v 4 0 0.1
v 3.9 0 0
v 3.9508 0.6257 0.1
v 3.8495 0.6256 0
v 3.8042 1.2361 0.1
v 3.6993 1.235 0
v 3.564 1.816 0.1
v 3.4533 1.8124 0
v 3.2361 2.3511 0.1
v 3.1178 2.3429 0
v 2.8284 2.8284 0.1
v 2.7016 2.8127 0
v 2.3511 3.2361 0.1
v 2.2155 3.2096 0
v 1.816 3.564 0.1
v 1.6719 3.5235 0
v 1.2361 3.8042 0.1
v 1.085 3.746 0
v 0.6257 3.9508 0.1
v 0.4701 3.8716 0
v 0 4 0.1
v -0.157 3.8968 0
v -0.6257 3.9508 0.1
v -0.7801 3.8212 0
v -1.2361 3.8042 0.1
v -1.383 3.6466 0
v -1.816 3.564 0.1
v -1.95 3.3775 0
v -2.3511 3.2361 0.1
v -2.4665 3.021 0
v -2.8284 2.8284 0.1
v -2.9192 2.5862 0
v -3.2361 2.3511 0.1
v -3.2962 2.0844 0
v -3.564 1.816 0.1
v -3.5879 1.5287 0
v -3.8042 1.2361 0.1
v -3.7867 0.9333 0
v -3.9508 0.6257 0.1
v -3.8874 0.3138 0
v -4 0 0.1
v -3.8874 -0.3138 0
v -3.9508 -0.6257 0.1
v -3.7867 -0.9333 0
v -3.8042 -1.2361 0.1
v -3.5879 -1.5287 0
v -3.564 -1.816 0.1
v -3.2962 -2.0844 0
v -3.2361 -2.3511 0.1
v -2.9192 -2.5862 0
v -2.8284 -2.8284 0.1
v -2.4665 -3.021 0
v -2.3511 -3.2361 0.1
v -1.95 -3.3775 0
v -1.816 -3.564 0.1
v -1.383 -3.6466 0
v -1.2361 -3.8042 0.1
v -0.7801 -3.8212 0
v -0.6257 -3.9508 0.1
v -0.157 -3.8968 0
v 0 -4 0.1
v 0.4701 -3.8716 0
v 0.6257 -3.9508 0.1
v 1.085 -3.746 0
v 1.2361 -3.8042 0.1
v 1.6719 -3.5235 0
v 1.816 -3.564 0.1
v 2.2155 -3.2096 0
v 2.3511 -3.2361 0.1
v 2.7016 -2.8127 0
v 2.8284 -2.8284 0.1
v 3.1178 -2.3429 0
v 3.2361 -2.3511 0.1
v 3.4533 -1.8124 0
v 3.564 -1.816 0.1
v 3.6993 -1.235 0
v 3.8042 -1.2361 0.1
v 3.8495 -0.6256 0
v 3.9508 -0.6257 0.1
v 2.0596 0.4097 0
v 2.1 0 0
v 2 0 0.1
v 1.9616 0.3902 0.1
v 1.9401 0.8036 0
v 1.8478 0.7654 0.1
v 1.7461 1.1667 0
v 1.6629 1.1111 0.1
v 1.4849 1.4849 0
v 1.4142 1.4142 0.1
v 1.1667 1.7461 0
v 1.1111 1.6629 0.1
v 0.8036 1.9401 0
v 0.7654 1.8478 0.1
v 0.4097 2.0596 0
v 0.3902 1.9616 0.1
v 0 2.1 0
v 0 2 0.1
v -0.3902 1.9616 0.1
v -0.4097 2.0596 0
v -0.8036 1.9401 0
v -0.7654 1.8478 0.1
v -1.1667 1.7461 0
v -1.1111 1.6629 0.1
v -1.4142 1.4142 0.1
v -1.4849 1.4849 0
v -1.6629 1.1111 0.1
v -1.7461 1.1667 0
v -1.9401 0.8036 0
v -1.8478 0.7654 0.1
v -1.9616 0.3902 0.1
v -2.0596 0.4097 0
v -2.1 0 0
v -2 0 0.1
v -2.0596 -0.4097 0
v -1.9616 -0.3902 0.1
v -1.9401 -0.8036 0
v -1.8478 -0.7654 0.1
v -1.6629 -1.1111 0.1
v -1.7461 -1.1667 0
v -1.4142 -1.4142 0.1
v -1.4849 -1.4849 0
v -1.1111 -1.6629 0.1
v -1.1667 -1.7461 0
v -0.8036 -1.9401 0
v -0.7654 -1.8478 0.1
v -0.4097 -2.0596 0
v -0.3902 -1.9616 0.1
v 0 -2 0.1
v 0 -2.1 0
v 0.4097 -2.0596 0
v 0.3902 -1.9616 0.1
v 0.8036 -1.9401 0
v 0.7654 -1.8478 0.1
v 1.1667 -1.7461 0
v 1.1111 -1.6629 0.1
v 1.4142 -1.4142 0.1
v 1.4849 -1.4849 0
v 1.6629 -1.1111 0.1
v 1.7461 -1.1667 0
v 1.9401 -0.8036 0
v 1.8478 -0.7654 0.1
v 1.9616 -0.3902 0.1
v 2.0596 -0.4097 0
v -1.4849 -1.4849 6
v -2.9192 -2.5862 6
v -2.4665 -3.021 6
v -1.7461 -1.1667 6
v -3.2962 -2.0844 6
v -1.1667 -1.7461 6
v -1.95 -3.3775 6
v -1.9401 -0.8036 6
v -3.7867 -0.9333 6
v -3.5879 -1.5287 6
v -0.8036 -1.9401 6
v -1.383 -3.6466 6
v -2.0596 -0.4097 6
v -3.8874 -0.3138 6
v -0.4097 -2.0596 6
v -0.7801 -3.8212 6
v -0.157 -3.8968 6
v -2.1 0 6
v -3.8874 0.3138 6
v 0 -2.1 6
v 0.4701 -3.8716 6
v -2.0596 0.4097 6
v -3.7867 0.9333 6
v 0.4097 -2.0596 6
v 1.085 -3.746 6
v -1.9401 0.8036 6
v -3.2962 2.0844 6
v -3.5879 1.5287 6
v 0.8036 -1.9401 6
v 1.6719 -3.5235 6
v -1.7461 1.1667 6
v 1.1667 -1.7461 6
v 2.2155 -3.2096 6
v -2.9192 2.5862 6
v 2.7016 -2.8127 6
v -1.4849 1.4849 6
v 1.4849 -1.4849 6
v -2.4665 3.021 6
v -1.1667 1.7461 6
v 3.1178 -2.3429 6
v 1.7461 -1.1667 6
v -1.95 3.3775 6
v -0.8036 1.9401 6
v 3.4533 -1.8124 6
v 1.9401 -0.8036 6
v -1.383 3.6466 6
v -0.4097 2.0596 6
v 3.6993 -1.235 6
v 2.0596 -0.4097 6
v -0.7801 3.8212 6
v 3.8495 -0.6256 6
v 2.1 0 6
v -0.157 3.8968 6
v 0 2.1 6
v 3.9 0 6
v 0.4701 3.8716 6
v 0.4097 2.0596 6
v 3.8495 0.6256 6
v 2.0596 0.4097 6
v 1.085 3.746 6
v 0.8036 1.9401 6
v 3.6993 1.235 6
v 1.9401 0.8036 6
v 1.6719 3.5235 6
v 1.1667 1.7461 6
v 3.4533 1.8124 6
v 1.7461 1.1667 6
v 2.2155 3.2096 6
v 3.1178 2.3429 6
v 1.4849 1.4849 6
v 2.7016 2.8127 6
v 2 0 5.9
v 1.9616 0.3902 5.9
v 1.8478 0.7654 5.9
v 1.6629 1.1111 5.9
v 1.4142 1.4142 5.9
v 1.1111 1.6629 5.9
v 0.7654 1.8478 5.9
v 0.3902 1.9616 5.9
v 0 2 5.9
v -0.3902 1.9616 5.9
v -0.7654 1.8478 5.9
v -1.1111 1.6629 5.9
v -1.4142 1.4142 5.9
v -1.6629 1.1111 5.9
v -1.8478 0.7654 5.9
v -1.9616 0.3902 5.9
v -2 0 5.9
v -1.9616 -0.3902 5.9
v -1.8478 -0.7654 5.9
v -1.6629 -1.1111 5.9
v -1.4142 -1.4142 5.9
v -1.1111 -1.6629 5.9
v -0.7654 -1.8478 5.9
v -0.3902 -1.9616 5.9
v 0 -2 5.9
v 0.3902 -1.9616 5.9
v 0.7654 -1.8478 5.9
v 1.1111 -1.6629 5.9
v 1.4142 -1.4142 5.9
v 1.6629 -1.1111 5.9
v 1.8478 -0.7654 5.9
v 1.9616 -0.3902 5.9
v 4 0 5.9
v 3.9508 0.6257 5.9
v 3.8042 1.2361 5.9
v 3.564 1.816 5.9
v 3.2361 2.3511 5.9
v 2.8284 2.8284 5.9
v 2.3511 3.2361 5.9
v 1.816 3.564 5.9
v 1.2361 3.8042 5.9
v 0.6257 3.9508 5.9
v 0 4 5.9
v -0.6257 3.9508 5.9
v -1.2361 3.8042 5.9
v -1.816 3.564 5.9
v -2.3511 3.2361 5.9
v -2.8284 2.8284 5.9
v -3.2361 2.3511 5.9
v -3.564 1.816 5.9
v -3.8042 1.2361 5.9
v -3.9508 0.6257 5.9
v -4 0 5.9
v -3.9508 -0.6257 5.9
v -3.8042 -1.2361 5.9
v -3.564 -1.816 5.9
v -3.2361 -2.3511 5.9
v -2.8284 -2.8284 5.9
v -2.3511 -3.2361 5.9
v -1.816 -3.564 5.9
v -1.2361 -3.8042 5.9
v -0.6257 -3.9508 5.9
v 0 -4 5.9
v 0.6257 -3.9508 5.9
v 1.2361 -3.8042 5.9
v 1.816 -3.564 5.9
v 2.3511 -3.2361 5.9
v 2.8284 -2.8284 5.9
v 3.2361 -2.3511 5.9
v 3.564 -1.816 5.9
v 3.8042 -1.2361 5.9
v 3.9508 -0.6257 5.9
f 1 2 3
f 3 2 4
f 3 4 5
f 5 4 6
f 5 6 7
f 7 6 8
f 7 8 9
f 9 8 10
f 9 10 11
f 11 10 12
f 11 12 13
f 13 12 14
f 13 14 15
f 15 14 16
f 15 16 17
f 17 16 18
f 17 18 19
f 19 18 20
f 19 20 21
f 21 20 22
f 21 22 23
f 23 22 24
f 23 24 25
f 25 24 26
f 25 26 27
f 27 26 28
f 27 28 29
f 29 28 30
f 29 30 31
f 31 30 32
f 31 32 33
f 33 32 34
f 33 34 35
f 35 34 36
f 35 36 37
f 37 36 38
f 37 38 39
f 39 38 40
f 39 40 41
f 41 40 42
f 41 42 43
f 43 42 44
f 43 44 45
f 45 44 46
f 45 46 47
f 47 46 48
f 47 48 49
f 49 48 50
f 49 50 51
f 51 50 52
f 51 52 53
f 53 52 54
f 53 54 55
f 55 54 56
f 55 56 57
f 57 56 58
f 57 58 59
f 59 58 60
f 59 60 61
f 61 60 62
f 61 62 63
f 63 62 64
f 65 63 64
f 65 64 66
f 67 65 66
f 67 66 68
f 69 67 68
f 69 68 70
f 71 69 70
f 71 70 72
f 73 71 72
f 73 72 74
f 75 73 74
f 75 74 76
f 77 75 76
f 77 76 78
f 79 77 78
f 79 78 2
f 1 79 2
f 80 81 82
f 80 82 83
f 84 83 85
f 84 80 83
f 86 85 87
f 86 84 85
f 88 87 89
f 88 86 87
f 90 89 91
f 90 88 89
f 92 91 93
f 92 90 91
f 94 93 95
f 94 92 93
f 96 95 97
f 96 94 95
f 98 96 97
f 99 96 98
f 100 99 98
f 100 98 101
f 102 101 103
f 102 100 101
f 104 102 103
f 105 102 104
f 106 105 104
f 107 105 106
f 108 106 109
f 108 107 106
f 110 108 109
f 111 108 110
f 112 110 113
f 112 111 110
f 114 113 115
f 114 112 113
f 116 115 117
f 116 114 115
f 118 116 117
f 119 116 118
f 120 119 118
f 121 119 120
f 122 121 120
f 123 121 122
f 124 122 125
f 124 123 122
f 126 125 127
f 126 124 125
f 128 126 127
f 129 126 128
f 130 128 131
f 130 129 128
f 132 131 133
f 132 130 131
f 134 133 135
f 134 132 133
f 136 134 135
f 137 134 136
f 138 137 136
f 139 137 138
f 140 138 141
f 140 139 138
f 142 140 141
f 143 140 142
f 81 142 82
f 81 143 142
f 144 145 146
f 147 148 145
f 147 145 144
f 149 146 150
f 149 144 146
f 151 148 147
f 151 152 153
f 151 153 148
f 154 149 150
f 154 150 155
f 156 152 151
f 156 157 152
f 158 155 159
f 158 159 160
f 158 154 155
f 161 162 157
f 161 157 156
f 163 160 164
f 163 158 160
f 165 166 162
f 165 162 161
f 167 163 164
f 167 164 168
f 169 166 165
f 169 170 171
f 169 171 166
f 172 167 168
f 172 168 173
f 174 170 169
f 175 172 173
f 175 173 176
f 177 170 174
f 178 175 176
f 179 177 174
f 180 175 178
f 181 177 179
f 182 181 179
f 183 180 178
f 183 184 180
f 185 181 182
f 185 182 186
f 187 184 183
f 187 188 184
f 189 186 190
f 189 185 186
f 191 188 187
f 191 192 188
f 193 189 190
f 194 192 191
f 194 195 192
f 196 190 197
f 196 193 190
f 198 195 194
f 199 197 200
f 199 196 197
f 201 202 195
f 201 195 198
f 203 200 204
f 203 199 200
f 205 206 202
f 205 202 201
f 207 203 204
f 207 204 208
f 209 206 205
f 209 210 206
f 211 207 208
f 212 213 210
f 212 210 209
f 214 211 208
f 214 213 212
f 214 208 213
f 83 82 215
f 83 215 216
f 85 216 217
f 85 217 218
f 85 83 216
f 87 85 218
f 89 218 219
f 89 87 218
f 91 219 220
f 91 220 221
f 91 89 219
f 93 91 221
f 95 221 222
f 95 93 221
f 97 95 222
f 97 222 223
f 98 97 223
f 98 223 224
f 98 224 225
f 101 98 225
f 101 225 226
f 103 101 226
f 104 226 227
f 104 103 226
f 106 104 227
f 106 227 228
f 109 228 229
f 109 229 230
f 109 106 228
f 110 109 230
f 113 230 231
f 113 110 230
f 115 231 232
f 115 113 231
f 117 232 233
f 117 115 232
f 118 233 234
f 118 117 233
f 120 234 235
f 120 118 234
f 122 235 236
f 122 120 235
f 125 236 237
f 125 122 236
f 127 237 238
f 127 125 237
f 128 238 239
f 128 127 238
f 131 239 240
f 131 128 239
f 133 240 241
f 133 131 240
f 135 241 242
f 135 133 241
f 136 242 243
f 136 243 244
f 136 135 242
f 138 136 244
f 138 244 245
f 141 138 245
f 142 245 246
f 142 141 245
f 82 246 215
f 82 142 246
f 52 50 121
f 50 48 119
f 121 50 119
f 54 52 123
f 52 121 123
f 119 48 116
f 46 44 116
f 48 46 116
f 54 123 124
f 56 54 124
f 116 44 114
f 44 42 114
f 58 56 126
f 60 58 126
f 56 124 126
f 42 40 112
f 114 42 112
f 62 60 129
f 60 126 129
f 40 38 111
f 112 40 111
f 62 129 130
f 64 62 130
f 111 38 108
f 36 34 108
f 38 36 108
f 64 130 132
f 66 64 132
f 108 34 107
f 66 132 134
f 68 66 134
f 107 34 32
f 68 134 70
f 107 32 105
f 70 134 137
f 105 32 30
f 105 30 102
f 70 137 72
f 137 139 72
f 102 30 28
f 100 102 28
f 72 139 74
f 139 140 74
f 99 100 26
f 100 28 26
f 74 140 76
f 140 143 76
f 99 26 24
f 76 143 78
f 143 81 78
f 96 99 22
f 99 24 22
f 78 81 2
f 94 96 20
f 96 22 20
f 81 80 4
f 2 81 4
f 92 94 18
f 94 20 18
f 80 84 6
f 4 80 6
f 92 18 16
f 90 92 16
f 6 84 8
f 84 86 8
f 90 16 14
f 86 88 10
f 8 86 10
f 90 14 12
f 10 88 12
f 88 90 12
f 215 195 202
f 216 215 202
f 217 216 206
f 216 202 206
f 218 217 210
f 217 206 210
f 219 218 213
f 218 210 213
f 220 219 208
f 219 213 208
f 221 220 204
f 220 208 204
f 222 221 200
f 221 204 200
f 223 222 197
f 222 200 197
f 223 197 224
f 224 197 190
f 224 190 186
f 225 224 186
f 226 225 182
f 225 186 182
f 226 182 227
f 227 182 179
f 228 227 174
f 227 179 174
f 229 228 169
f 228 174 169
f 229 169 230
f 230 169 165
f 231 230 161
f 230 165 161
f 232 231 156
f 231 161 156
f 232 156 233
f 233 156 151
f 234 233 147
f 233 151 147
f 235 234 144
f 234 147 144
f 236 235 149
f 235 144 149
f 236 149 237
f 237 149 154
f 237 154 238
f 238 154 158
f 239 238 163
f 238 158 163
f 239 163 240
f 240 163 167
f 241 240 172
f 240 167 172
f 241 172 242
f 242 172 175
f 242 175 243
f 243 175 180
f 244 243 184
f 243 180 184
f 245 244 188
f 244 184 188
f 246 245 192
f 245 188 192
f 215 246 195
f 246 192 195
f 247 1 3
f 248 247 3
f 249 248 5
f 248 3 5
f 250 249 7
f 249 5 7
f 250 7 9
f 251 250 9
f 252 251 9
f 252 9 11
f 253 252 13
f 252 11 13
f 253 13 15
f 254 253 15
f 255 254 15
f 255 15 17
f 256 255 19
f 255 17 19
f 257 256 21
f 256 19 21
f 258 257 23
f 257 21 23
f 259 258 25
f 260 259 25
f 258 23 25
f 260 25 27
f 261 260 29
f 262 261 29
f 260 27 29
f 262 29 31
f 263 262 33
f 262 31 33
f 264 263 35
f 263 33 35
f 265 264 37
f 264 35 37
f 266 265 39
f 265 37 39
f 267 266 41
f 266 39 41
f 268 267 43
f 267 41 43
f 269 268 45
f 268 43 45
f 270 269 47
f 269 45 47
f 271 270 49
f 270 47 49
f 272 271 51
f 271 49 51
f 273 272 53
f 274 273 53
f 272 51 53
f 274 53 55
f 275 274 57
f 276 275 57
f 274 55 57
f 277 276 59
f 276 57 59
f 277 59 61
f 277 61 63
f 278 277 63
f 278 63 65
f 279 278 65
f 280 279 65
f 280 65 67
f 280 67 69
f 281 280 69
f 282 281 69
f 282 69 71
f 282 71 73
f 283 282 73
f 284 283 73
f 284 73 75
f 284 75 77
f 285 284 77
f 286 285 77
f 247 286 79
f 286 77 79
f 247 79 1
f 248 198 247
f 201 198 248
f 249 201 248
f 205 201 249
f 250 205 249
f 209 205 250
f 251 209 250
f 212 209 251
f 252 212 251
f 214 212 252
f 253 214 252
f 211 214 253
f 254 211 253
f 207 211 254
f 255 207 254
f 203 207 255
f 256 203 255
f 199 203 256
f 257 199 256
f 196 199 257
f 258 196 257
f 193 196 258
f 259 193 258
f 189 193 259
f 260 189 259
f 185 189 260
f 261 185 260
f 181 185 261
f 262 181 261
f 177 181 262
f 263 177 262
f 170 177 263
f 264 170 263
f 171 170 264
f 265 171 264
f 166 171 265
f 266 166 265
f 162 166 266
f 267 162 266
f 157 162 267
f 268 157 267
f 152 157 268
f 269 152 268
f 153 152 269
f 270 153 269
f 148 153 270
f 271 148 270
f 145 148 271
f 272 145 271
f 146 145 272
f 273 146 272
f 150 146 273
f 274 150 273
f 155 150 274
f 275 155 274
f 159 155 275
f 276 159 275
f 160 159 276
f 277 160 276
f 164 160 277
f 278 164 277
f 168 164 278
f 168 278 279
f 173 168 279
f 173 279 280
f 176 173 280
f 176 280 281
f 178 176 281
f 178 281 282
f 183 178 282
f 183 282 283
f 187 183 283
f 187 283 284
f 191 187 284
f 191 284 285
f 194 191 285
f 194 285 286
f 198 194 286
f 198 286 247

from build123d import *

# Parameters (mm, degrees)
CROQUIS1_R              = 4
CROQUIS1_R_2            = 2
SALIENTE_EXTRUIR1_DEPTH = 6
CHAFL_N1_SIZE           = 0.1


with BuildPart() as part:
    # Croquis1 → Saliente-Extruir1 (new body)
    with BuildSketch(Plane.XY):
        Circle(CROQUIS1_R)
        Circle(CROQUIS1_R_2, mode=Mode.SUBTRACT)
    extrude(amount=SALIENTE_EXTRUIR1_DEPTH)

    # Chaflán1
    chafl_n1_edges = [part.edges().sort_by_distance(p)[0] for p in [
        (-4, 0, 0),
        (-4, 0, 6),
        (-2, 0, 0),
        (-2, 0, 6),
    ]]
    chamfer(chafl_n1_edges, length=CHAFL_N1_SIZE)


solid = part.part
